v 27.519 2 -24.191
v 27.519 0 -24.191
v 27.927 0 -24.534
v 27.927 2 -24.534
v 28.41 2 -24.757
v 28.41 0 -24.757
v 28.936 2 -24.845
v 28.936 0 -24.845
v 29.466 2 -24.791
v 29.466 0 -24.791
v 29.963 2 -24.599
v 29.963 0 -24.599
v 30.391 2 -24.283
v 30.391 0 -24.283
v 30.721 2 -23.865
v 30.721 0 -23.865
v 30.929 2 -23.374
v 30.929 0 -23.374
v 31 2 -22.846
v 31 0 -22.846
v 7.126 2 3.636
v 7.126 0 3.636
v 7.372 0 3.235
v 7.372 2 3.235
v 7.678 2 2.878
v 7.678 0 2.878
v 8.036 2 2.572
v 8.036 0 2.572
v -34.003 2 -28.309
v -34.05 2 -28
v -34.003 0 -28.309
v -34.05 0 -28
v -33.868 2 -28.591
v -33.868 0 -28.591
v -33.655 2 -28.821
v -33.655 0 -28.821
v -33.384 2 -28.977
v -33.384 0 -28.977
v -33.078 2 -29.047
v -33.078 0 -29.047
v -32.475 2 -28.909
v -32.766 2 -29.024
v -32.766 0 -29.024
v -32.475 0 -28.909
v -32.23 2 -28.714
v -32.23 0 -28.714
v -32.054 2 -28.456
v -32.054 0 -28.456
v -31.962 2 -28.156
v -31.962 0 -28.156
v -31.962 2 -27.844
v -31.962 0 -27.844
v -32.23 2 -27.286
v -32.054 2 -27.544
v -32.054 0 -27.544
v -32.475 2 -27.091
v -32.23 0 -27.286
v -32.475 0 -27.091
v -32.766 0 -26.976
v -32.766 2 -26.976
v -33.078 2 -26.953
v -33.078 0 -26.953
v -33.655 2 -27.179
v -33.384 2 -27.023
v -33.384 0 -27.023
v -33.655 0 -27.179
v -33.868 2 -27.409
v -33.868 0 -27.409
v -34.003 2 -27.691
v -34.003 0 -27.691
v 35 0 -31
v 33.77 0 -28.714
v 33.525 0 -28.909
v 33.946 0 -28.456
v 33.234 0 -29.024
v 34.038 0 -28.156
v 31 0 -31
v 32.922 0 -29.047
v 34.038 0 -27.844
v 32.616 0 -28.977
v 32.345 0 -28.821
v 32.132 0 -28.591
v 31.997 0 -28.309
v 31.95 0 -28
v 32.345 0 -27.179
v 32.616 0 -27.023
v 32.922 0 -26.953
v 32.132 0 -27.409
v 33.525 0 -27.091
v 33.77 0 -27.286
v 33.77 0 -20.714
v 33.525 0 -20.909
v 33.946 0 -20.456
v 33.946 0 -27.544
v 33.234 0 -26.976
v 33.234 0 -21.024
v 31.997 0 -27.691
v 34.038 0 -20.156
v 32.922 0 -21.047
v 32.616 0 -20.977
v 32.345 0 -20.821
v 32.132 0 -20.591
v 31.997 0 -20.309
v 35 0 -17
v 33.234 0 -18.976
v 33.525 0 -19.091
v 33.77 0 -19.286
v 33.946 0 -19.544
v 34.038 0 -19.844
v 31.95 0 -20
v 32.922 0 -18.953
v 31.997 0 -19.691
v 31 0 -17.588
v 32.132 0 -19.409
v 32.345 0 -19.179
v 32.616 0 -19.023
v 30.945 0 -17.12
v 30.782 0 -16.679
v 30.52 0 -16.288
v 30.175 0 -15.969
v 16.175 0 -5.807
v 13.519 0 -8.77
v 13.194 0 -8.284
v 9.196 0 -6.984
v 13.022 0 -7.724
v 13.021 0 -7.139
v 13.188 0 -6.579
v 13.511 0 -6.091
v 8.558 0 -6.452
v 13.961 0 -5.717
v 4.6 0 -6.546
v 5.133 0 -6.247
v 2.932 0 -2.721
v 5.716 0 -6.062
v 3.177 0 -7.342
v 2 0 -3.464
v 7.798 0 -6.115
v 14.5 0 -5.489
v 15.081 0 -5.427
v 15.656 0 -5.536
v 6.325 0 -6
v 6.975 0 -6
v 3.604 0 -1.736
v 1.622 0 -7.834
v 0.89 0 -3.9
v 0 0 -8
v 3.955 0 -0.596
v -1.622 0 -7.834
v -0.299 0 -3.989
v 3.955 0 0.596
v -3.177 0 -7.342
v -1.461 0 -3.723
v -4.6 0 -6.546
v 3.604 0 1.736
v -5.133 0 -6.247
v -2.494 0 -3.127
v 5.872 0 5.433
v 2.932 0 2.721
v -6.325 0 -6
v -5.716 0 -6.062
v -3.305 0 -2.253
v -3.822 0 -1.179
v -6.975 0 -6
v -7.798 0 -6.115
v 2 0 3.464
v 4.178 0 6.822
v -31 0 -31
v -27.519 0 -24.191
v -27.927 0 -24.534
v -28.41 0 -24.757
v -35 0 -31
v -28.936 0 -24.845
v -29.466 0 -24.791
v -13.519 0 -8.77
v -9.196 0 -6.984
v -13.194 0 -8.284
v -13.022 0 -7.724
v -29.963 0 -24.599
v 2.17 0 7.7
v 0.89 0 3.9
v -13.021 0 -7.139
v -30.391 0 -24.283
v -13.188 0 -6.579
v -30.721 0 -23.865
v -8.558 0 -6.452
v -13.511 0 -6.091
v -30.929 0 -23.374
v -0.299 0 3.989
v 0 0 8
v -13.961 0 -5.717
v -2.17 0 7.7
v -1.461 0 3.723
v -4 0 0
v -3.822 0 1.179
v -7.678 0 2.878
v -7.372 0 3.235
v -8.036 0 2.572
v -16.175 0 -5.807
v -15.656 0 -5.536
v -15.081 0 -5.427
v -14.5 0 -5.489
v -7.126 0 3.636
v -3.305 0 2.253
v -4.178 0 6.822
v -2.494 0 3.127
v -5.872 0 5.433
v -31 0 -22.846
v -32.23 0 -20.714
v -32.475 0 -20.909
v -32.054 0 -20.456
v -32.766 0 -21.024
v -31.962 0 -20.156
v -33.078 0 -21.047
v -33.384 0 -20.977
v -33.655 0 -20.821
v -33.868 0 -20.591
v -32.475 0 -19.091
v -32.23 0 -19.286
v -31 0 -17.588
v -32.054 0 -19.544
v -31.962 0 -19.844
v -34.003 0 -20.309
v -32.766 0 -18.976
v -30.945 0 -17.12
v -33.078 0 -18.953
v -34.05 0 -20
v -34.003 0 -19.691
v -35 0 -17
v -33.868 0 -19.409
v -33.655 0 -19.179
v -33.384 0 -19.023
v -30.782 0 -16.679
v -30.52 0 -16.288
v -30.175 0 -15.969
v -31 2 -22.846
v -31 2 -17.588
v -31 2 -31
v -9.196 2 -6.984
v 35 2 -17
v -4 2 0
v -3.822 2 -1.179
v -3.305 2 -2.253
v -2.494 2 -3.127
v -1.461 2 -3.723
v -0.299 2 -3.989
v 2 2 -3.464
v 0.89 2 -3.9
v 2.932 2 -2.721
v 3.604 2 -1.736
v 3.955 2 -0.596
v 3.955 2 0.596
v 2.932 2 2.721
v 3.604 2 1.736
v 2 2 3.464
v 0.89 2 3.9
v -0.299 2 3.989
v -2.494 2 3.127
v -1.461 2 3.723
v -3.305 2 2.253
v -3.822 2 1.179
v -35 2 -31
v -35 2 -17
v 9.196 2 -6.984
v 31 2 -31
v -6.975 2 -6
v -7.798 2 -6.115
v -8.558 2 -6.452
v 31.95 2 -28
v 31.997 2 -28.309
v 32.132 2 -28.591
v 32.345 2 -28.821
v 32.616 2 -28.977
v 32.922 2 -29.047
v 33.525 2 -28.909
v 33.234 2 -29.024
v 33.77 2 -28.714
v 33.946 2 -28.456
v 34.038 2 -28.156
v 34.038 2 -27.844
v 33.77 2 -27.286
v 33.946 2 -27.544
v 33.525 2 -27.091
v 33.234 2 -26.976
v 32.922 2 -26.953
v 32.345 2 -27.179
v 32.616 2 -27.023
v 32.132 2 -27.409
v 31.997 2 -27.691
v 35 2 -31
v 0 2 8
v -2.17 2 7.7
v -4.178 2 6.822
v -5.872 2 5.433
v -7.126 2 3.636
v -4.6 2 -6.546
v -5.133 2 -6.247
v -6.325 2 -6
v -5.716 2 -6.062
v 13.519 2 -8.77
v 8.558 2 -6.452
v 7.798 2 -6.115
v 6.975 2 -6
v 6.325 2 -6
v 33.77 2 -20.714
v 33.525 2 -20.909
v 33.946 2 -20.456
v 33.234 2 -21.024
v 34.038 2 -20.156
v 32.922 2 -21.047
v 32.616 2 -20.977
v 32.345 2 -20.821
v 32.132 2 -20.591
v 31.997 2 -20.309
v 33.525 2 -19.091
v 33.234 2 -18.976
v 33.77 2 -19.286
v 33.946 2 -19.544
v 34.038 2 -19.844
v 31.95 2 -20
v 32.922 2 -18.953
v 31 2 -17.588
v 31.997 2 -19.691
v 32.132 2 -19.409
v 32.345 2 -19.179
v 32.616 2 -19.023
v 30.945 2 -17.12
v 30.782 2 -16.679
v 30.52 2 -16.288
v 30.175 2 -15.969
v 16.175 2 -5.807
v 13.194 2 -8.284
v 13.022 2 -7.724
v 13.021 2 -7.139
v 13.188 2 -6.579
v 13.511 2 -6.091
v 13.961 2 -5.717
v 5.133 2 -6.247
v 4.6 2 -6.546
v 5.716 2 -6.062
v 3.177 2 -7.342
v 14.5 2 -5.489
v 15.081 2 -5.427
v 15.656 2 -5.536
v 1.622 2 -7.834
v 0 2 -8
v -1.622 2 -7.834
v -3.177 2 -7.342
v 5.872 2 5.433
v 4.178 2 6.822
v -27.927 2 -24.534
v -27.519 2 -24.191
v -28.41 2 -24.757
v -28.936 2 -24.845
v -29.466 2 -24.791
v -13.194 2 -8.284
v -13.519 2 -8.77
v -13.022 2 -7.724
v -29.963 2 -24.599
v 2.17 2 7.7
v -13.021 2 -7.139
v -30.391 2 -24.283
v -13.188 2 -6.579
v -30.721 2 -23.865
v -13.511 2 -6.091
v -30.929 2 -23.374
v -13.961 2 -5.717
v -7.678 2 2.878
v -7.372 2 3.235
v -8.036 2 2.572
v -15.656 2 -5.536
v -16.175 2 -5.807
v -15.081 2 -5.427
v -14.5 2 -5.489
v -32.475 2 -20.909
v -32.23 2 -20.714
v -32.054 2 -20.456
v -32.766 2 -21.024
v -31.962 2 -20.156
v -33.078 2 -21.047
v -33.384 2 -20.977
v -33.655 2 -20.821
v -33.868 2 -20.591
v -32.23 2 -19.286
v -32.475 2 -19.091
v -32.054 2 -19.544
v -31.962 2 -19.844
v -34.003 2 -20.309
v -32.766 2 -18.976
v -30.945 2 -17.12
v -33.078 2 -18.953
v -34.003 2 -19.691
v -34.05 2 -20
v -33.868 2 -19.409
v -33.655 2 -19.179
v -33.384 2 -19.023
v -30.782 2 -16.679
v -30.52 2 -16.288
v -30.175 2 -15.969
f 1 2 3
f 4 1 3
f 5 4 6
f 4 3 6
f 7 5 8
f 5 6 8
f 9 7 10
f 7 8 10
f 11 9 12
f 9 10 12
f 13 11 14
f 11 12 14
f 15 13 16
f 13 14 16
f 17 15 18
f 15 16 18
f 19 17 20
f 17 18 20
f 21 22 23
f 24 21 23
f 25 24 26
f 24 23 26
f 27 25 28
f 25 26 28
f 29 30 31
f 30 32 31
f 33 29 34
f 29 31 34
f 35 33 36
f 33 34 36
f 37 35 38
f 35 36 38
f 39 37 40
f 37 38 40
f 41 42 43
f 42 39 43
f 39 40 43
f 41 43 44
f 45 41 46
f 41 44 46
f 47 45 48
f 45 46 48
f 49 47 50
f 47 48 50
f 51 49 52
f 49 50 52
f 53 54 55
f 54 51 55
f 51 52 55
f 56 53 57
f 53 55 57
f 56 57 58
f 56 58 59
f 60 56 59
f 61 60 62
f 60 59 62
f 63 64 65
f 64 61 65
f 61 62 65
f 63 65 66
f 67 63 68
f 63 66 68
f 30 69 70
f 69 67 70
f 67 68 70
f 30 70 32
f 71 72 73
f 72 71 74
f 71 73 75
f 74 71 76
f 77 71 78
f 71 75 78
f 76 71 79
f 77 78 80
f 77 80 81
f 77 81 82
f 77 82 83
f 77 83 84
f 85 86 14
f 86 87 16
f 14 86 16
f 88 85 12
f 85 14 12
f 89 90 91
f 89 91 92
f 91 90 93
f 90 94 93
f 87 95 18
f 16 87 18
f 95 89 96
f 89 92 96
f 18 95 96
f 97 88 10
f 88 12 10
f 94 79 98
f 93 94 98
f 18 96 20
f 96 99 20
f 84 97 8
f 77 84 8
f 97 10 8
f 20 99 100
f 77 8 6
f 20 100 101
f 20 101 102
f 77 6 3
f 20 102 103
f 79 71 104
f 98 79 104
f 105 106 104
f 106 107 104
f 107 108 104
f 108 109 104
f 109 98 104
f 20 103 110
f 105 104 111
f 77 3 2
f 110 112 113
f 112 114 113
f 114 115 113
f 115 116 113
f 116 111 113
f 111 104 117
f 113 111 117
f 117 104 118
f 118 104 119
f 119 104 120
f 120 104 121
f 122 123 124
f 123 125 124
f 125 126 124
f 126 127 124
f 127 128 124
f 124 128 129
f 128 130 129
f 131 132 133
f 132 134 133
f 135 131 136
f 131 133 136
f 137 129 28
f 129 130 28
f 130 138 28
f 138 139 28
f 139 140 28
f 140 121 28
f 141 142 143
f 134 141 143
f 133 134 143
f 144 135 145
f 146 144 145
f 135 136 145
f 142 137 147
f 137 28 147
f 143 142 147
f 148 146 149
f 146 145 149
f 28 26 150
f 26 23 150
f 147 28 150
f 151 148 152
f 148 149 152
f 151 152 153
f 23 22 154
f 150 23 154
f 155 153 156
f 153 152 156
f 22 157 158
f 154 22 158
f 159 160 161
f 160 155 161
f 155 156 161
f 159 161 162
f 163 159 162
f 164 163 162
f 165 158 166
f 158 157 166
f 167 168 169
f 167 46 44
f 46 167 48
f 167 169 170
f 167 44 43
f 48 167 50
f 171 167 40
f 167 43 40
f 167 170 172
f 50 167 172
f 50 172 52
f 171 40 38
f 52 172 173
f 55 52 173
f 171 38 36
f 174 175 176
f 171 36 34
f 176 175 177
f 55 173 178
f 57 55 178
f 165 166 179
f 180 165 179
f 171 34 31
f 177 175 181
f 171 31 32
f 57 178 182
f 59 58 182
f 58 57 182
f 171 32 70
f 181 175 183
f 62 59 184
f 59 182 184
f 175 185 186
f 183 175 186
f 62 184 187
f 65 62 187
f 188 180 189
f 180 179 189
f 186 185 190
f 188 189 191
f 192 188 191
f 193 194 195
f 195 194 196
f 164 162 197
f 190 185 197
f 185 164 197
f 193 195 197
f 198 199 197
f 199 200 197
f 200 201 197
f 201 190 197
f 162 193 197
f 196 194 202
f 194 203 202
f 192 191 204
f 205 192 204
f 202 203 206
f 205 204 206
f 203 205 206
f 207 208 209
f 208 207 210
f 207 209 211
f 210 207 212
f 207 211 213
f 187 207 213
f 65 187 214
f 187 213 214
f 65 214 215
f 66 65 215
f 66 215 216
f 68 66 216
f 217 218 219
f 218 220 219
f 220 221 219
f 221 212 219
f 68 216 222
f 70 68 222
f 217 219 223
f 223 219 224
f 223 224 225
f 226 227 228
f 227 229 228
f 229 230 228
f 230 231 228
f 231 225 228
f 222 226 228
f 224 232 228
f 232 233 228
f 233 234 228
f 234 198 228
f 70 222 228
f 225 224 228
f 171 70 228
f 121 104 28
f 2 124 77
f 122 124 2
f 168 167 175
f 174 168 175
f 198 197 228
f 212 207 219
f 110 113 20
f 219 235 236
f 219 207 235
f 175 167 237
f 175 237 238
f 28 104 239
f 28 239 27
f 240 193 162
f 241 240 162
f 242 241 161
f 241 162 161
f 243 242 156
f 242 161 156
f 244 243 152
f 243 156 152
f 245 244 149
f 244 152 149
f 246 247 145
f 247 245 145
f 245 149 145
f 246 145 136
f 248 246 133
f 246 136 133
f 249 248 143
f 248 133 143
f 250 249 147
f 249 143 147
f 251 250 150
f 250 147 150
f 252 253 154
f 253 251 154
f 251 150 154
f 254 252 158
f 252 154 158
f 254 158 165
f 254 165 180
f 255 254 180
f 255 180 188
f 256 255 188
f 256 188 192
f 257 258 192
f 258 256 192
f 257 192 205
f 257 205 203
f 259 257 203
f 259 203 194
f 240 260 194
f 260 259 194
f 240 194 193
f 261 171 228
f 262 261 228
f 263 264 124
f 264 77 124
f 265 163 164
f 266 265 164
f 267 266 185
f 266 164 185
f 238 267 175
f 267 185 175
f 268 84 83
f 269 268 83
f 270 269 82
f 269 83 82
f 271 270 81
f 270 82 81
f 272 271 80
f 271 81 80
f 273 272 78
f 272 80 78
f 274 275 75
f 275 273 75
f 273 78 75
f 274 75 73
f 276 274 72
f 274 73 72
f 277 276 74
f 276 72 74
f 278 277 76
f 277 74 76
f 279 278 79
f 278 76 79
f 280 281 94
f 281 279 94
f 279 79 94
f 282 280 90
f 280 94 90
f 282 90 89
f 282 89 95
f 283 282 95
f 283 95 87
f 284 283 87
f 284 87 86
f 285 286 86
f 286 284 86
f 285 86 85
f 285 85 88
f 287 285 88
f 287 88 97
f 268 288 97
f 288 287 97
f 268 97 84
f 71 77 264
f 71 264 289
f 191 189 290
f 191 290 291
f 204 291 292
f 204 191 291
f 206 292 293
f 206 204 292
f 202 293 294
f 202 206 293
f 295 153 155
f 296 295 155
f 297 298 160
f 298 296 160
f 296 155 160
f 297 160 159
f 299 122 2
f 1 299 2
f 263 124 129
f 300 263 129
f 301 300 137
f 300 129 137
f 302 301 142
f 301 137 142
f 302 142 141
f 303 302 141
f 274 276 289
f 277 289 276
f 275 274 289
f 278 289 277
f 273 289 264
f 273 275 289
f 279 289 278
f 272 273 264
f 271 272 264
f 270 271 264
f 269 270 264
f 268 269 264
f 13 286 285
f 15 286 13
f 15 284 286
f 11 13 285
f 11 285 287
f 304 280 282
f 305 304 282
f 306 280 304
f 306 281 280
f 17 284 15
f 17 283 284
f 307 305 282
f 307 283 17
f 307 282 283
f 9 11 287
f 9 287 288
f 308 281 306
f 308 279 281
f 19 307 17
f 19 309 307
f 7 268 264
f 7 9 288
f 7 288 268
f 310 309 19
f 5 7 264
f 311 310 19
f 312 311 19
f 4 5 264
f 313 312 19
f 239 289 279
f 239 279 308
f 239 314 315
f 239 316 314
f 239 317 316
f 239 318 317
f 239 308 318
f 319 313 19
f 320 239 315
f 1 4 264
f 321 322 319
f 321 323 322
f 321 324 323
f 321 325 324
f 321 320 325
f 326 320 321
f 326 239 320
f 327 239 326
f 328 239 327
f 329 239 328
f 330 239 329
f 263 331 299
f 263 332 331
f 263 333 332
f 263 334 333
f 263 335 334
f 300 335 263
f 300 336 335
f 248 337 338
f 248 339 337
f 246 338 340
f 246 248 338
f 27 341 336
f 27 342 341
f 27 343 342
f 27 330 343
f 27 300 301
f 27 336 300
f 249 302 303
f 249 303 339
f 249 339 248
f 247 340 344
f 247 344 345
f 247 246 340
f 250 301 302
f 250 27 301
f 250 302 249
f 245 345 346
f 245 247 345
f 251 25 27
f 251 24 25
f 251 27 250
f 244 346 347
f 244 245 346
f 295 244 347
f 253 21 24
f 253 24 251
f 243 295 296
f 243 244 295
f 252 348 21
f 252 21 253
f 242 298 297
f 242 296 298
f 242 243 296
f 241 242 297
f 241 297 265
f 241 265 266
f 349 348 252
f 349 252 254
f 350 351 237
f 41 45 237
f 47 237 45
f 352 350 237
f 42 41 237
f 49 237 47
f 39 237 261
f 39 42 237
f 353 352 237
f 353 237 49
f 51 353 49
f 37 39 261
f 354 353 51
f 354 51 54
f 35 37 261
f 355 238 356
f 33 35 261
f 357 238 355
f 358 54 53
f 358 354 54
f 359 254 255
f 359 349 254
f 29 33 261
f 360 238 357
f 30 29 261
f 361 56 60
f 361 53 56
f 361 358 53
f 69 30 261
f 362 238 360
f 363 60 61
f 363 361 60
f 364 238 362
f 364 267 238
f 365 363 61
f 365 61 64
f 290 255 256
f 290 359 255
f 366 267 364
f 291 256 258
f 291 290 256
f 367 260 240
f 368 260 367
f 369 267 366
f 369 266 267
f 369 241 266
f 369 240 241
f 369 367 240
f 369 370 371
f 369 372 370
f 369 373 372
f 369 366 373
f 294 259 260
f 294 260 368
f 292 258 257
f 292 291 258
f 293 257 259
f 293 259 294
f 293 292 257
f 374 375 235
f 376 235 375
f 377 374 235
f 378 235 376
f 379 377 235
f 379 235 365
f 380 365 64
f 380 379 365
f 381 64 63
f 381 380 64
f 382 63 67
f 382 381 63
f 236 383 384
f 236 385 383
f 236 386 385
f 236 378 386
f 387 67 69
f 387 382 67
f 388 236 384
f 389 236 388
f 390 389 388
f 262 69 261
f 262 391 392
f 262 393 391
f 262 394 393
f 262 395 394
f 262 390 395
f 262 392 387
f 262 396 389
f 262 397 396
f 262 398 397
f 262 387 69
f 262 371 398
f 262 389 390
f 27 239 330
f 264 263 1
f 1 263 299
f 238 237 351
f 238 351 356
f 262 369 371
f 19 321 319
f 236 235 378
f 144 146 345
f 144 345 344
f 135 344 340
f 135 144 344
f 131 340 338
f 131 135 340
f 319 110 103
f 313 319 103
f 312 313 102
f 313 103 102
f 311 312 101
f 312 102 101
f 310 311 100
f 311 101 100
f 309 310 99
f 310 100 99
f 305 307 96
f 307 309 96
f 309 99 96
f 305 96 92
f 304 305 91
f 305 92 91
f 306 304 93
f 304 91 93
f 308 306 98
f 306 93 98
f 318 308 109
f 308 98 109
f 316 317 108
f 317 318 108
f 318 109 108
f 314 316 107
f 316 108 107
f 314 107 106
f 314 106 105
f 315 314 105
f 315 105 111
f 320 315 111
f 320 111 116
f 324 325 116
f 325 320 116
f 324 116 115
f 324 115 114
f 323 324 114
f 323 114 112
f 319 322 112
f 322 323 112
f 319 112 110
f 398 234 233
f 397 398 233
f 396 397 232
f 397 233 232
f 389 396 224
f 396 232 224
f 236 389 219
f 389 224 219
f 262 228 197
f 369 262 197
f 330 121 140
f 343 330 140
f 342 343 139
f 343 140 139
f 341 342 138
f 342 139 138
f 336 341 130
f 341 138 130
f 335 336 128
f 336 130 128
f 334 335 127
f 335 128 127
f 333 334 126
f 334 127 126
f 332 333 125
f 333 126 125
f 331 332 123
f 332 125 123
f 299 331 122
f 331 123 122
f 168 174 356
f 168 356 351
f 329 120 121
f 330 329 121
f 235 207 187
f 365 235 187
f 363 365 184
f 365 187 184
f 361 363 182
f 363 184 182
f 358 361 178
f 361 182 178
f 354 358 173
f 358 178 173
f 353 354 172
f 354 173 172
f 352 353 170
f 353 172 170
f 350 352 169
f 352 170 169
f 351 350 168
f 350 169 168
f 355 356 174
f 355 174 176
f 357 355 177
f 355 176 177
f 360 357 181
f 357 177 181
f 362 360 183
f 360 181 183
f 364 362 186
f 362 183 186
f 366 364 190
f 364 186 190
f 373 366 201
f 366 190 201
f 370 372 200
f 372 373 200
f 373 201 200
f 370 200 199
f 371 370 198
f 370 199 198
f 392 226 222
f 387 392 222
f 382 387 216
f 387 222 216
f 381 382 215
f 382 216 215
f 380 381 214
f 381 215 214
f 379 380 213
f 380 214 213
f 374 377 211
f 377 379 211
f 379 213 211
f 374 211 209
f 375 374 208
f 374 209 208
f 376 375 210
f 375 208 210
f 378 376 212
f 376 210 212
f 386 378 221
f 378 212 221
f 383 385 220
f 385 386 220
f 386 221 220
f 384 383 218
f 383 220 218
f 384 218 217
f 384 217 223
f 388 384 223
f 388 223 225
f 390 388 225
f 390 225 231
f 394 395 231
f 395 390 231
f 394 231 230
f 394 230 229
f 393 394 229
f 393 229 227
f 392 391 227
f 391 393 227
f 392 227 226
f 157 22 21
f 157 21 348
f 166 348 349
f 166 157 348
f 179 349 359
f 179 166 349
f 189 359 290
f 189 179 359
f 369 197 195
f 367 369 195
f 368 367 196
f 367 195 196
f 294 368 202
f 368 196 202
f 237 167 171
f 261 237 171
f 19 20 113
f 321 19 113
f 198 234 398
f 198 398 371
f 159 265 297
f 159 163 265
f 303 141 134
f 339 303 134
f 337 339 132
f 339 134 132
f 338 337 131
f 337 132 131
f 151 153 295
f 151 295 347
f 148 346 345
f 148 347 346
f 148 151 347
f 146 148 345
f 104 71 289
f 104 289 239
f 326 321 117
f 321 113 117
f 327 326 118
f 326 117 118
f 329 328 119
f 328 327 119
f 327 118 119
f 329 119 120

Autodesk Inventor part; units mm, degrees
ref_plane "YZ Plane" through (0, 0, 0) normal (1, 0, 0) x (0, 1, 0)
ref_plane "XZ Plane" through (0, 0, 0) normal (0, 1, 0) x (-1, 0, 0)
ref_plane "XY Plane" through (0, 0, 0) normal (0, 0, 1) x (1, 0, 0)
sketch "スケッチ1" plane through (0, 0, 0) normal (0, 1, 0) x (-1, 0, 0)
  arc A0 (0, -8) -> (4.5997, -6.5455) centre (0, 0) ccw
  line L0 (33, -28) -> (33, -20) construction
  line L1 (0, 0) -> (0, -13.0211) construction
  circle A1 centre (33, -28) radius 1.05
  circle A2 centre (33, -20) radius 1.05
  line L2 (31, -31) -> (9.1961, -6.9835)
  line L3 (31, -31) -> (35, -31)
  line L4 (35, -31) -> (35, -17)
  line L5 (35, -17) -> (8.0357, 2.5722)
  line L6 (31, -22.8462) -> (31, -17.5875)
  line L7 (30.1748, -15.969) -> (16.1748, -5.807)
  line L8 (13.5192, -8.7699) -> (27.5192, -24.1906)
  arc A3 (27.5192, -24.1906) -> (31, -22.8462) centre (29, -22.8462) ccw
  arc A4 (31, -17.5875) -> (30.1748, -15.969) centre (29, -17.5875) ccw
  arc A5 (16.1748, -5.807) -> (13.5192, -8.7699) centre (15, -7.4256) ccw
  line L9 (6.9749, -6) -> (6.3246, -6)
  arc A6 (7.1258, 3.6364) -> (0, 8) centre (0, 0) ccw
  line L10 (0, 8) -> (0, 0) construction
  arc A7 (6.3246, -6) -> (4.5997, -6.5455) centre (6.3246, -9) ccw
  arc A8 (7.1258, 3.6364) -> (8.0357, 2.5722) centre (9.798, 5) ccw
  arc A9 (9.1961, -6.9835) -> (6.9749, -6) centre (6.9749, -9) ccw
  arc A10 (-4.5997, -6.5455) -> (0, -8) centre (0, 0) ccw
  line L11 (-33, -28) -> (-33, -20) construction
  circle A11 centre (-33, -28) radius 1.05
  circle A12 centre (-33, -20) radius 1.05
  line L12 (-31, -31) -> (-9.1961, -6.9835)
  line L13 (-31, -31) -> (-35, -31)
  line L14 (-35, -31) -> (-35, -17)
  line L15 (-35, -17) -> (-8.0357, 2.5722)
  line L16 (-31, -22.8462) -> (-31, -17.5875)
  line L17 (-30.1748, -15.969) -> (-16.1748, -5.807)
  line L18 (-13.5192, -8.7699) -> (-27.5192, -24.1906)
  arc A13 (-31, -22.8462) -> (-27.5192, -24.1906) centre (-29, -22.8462) ccw
  arc A14 (-30.1748, -15.969) -> (-31, -17.5875) centre (-29, -17.5875) ccw
  arc A15 (-13.5192, -8.7699) -> (-16.1748, -5.807) centre (-15, -7.4256) ccw
  line L19 (-6.9749, -6) -> (-6.3246, -6)
  arc A16 (0, 8) -> (-7.1258, 3.6364) centre (0, 0) ccw
  arc A17 (-4.5997, -6.5455) -> (-6.3246, -6) centre (-6.3246, -9) ccw
  arc A18 (-8.0357, 2.5722) -> (-7.1258, 3.6364) centre (-9.798, 5) ccw
  arc A19 (-6.9749, -6) -> (-9.1961, -6.9835) centre (-6.9749, -9) ccw
  circle A20 centre (0, 0) radius 4
  point P0 (5.2915, -6)
  point P1 (-5.2915, -6)
  dimension "d0" = 2.1
  dimension "d1" = 8
  dimension "d2" = 4
  dimension "d3" = 3
  dimension "d4" = 3
  dimension "d5" = 70
  dimension "d6" = 2
  dimension "d7" = 2
  dimension "d8" = 2
  dimension "d10" = 8
  dimension "d11" = 3
  dimension "d12" = 20
  dimension "d13" = 6
  dimension "d14" = 5
  dimension "d15" = 15
  dimension "d16" = 8
extrude "押し出し1" add sketch "スケッチ1" along normal blind 2
properties part number "shoulder"
